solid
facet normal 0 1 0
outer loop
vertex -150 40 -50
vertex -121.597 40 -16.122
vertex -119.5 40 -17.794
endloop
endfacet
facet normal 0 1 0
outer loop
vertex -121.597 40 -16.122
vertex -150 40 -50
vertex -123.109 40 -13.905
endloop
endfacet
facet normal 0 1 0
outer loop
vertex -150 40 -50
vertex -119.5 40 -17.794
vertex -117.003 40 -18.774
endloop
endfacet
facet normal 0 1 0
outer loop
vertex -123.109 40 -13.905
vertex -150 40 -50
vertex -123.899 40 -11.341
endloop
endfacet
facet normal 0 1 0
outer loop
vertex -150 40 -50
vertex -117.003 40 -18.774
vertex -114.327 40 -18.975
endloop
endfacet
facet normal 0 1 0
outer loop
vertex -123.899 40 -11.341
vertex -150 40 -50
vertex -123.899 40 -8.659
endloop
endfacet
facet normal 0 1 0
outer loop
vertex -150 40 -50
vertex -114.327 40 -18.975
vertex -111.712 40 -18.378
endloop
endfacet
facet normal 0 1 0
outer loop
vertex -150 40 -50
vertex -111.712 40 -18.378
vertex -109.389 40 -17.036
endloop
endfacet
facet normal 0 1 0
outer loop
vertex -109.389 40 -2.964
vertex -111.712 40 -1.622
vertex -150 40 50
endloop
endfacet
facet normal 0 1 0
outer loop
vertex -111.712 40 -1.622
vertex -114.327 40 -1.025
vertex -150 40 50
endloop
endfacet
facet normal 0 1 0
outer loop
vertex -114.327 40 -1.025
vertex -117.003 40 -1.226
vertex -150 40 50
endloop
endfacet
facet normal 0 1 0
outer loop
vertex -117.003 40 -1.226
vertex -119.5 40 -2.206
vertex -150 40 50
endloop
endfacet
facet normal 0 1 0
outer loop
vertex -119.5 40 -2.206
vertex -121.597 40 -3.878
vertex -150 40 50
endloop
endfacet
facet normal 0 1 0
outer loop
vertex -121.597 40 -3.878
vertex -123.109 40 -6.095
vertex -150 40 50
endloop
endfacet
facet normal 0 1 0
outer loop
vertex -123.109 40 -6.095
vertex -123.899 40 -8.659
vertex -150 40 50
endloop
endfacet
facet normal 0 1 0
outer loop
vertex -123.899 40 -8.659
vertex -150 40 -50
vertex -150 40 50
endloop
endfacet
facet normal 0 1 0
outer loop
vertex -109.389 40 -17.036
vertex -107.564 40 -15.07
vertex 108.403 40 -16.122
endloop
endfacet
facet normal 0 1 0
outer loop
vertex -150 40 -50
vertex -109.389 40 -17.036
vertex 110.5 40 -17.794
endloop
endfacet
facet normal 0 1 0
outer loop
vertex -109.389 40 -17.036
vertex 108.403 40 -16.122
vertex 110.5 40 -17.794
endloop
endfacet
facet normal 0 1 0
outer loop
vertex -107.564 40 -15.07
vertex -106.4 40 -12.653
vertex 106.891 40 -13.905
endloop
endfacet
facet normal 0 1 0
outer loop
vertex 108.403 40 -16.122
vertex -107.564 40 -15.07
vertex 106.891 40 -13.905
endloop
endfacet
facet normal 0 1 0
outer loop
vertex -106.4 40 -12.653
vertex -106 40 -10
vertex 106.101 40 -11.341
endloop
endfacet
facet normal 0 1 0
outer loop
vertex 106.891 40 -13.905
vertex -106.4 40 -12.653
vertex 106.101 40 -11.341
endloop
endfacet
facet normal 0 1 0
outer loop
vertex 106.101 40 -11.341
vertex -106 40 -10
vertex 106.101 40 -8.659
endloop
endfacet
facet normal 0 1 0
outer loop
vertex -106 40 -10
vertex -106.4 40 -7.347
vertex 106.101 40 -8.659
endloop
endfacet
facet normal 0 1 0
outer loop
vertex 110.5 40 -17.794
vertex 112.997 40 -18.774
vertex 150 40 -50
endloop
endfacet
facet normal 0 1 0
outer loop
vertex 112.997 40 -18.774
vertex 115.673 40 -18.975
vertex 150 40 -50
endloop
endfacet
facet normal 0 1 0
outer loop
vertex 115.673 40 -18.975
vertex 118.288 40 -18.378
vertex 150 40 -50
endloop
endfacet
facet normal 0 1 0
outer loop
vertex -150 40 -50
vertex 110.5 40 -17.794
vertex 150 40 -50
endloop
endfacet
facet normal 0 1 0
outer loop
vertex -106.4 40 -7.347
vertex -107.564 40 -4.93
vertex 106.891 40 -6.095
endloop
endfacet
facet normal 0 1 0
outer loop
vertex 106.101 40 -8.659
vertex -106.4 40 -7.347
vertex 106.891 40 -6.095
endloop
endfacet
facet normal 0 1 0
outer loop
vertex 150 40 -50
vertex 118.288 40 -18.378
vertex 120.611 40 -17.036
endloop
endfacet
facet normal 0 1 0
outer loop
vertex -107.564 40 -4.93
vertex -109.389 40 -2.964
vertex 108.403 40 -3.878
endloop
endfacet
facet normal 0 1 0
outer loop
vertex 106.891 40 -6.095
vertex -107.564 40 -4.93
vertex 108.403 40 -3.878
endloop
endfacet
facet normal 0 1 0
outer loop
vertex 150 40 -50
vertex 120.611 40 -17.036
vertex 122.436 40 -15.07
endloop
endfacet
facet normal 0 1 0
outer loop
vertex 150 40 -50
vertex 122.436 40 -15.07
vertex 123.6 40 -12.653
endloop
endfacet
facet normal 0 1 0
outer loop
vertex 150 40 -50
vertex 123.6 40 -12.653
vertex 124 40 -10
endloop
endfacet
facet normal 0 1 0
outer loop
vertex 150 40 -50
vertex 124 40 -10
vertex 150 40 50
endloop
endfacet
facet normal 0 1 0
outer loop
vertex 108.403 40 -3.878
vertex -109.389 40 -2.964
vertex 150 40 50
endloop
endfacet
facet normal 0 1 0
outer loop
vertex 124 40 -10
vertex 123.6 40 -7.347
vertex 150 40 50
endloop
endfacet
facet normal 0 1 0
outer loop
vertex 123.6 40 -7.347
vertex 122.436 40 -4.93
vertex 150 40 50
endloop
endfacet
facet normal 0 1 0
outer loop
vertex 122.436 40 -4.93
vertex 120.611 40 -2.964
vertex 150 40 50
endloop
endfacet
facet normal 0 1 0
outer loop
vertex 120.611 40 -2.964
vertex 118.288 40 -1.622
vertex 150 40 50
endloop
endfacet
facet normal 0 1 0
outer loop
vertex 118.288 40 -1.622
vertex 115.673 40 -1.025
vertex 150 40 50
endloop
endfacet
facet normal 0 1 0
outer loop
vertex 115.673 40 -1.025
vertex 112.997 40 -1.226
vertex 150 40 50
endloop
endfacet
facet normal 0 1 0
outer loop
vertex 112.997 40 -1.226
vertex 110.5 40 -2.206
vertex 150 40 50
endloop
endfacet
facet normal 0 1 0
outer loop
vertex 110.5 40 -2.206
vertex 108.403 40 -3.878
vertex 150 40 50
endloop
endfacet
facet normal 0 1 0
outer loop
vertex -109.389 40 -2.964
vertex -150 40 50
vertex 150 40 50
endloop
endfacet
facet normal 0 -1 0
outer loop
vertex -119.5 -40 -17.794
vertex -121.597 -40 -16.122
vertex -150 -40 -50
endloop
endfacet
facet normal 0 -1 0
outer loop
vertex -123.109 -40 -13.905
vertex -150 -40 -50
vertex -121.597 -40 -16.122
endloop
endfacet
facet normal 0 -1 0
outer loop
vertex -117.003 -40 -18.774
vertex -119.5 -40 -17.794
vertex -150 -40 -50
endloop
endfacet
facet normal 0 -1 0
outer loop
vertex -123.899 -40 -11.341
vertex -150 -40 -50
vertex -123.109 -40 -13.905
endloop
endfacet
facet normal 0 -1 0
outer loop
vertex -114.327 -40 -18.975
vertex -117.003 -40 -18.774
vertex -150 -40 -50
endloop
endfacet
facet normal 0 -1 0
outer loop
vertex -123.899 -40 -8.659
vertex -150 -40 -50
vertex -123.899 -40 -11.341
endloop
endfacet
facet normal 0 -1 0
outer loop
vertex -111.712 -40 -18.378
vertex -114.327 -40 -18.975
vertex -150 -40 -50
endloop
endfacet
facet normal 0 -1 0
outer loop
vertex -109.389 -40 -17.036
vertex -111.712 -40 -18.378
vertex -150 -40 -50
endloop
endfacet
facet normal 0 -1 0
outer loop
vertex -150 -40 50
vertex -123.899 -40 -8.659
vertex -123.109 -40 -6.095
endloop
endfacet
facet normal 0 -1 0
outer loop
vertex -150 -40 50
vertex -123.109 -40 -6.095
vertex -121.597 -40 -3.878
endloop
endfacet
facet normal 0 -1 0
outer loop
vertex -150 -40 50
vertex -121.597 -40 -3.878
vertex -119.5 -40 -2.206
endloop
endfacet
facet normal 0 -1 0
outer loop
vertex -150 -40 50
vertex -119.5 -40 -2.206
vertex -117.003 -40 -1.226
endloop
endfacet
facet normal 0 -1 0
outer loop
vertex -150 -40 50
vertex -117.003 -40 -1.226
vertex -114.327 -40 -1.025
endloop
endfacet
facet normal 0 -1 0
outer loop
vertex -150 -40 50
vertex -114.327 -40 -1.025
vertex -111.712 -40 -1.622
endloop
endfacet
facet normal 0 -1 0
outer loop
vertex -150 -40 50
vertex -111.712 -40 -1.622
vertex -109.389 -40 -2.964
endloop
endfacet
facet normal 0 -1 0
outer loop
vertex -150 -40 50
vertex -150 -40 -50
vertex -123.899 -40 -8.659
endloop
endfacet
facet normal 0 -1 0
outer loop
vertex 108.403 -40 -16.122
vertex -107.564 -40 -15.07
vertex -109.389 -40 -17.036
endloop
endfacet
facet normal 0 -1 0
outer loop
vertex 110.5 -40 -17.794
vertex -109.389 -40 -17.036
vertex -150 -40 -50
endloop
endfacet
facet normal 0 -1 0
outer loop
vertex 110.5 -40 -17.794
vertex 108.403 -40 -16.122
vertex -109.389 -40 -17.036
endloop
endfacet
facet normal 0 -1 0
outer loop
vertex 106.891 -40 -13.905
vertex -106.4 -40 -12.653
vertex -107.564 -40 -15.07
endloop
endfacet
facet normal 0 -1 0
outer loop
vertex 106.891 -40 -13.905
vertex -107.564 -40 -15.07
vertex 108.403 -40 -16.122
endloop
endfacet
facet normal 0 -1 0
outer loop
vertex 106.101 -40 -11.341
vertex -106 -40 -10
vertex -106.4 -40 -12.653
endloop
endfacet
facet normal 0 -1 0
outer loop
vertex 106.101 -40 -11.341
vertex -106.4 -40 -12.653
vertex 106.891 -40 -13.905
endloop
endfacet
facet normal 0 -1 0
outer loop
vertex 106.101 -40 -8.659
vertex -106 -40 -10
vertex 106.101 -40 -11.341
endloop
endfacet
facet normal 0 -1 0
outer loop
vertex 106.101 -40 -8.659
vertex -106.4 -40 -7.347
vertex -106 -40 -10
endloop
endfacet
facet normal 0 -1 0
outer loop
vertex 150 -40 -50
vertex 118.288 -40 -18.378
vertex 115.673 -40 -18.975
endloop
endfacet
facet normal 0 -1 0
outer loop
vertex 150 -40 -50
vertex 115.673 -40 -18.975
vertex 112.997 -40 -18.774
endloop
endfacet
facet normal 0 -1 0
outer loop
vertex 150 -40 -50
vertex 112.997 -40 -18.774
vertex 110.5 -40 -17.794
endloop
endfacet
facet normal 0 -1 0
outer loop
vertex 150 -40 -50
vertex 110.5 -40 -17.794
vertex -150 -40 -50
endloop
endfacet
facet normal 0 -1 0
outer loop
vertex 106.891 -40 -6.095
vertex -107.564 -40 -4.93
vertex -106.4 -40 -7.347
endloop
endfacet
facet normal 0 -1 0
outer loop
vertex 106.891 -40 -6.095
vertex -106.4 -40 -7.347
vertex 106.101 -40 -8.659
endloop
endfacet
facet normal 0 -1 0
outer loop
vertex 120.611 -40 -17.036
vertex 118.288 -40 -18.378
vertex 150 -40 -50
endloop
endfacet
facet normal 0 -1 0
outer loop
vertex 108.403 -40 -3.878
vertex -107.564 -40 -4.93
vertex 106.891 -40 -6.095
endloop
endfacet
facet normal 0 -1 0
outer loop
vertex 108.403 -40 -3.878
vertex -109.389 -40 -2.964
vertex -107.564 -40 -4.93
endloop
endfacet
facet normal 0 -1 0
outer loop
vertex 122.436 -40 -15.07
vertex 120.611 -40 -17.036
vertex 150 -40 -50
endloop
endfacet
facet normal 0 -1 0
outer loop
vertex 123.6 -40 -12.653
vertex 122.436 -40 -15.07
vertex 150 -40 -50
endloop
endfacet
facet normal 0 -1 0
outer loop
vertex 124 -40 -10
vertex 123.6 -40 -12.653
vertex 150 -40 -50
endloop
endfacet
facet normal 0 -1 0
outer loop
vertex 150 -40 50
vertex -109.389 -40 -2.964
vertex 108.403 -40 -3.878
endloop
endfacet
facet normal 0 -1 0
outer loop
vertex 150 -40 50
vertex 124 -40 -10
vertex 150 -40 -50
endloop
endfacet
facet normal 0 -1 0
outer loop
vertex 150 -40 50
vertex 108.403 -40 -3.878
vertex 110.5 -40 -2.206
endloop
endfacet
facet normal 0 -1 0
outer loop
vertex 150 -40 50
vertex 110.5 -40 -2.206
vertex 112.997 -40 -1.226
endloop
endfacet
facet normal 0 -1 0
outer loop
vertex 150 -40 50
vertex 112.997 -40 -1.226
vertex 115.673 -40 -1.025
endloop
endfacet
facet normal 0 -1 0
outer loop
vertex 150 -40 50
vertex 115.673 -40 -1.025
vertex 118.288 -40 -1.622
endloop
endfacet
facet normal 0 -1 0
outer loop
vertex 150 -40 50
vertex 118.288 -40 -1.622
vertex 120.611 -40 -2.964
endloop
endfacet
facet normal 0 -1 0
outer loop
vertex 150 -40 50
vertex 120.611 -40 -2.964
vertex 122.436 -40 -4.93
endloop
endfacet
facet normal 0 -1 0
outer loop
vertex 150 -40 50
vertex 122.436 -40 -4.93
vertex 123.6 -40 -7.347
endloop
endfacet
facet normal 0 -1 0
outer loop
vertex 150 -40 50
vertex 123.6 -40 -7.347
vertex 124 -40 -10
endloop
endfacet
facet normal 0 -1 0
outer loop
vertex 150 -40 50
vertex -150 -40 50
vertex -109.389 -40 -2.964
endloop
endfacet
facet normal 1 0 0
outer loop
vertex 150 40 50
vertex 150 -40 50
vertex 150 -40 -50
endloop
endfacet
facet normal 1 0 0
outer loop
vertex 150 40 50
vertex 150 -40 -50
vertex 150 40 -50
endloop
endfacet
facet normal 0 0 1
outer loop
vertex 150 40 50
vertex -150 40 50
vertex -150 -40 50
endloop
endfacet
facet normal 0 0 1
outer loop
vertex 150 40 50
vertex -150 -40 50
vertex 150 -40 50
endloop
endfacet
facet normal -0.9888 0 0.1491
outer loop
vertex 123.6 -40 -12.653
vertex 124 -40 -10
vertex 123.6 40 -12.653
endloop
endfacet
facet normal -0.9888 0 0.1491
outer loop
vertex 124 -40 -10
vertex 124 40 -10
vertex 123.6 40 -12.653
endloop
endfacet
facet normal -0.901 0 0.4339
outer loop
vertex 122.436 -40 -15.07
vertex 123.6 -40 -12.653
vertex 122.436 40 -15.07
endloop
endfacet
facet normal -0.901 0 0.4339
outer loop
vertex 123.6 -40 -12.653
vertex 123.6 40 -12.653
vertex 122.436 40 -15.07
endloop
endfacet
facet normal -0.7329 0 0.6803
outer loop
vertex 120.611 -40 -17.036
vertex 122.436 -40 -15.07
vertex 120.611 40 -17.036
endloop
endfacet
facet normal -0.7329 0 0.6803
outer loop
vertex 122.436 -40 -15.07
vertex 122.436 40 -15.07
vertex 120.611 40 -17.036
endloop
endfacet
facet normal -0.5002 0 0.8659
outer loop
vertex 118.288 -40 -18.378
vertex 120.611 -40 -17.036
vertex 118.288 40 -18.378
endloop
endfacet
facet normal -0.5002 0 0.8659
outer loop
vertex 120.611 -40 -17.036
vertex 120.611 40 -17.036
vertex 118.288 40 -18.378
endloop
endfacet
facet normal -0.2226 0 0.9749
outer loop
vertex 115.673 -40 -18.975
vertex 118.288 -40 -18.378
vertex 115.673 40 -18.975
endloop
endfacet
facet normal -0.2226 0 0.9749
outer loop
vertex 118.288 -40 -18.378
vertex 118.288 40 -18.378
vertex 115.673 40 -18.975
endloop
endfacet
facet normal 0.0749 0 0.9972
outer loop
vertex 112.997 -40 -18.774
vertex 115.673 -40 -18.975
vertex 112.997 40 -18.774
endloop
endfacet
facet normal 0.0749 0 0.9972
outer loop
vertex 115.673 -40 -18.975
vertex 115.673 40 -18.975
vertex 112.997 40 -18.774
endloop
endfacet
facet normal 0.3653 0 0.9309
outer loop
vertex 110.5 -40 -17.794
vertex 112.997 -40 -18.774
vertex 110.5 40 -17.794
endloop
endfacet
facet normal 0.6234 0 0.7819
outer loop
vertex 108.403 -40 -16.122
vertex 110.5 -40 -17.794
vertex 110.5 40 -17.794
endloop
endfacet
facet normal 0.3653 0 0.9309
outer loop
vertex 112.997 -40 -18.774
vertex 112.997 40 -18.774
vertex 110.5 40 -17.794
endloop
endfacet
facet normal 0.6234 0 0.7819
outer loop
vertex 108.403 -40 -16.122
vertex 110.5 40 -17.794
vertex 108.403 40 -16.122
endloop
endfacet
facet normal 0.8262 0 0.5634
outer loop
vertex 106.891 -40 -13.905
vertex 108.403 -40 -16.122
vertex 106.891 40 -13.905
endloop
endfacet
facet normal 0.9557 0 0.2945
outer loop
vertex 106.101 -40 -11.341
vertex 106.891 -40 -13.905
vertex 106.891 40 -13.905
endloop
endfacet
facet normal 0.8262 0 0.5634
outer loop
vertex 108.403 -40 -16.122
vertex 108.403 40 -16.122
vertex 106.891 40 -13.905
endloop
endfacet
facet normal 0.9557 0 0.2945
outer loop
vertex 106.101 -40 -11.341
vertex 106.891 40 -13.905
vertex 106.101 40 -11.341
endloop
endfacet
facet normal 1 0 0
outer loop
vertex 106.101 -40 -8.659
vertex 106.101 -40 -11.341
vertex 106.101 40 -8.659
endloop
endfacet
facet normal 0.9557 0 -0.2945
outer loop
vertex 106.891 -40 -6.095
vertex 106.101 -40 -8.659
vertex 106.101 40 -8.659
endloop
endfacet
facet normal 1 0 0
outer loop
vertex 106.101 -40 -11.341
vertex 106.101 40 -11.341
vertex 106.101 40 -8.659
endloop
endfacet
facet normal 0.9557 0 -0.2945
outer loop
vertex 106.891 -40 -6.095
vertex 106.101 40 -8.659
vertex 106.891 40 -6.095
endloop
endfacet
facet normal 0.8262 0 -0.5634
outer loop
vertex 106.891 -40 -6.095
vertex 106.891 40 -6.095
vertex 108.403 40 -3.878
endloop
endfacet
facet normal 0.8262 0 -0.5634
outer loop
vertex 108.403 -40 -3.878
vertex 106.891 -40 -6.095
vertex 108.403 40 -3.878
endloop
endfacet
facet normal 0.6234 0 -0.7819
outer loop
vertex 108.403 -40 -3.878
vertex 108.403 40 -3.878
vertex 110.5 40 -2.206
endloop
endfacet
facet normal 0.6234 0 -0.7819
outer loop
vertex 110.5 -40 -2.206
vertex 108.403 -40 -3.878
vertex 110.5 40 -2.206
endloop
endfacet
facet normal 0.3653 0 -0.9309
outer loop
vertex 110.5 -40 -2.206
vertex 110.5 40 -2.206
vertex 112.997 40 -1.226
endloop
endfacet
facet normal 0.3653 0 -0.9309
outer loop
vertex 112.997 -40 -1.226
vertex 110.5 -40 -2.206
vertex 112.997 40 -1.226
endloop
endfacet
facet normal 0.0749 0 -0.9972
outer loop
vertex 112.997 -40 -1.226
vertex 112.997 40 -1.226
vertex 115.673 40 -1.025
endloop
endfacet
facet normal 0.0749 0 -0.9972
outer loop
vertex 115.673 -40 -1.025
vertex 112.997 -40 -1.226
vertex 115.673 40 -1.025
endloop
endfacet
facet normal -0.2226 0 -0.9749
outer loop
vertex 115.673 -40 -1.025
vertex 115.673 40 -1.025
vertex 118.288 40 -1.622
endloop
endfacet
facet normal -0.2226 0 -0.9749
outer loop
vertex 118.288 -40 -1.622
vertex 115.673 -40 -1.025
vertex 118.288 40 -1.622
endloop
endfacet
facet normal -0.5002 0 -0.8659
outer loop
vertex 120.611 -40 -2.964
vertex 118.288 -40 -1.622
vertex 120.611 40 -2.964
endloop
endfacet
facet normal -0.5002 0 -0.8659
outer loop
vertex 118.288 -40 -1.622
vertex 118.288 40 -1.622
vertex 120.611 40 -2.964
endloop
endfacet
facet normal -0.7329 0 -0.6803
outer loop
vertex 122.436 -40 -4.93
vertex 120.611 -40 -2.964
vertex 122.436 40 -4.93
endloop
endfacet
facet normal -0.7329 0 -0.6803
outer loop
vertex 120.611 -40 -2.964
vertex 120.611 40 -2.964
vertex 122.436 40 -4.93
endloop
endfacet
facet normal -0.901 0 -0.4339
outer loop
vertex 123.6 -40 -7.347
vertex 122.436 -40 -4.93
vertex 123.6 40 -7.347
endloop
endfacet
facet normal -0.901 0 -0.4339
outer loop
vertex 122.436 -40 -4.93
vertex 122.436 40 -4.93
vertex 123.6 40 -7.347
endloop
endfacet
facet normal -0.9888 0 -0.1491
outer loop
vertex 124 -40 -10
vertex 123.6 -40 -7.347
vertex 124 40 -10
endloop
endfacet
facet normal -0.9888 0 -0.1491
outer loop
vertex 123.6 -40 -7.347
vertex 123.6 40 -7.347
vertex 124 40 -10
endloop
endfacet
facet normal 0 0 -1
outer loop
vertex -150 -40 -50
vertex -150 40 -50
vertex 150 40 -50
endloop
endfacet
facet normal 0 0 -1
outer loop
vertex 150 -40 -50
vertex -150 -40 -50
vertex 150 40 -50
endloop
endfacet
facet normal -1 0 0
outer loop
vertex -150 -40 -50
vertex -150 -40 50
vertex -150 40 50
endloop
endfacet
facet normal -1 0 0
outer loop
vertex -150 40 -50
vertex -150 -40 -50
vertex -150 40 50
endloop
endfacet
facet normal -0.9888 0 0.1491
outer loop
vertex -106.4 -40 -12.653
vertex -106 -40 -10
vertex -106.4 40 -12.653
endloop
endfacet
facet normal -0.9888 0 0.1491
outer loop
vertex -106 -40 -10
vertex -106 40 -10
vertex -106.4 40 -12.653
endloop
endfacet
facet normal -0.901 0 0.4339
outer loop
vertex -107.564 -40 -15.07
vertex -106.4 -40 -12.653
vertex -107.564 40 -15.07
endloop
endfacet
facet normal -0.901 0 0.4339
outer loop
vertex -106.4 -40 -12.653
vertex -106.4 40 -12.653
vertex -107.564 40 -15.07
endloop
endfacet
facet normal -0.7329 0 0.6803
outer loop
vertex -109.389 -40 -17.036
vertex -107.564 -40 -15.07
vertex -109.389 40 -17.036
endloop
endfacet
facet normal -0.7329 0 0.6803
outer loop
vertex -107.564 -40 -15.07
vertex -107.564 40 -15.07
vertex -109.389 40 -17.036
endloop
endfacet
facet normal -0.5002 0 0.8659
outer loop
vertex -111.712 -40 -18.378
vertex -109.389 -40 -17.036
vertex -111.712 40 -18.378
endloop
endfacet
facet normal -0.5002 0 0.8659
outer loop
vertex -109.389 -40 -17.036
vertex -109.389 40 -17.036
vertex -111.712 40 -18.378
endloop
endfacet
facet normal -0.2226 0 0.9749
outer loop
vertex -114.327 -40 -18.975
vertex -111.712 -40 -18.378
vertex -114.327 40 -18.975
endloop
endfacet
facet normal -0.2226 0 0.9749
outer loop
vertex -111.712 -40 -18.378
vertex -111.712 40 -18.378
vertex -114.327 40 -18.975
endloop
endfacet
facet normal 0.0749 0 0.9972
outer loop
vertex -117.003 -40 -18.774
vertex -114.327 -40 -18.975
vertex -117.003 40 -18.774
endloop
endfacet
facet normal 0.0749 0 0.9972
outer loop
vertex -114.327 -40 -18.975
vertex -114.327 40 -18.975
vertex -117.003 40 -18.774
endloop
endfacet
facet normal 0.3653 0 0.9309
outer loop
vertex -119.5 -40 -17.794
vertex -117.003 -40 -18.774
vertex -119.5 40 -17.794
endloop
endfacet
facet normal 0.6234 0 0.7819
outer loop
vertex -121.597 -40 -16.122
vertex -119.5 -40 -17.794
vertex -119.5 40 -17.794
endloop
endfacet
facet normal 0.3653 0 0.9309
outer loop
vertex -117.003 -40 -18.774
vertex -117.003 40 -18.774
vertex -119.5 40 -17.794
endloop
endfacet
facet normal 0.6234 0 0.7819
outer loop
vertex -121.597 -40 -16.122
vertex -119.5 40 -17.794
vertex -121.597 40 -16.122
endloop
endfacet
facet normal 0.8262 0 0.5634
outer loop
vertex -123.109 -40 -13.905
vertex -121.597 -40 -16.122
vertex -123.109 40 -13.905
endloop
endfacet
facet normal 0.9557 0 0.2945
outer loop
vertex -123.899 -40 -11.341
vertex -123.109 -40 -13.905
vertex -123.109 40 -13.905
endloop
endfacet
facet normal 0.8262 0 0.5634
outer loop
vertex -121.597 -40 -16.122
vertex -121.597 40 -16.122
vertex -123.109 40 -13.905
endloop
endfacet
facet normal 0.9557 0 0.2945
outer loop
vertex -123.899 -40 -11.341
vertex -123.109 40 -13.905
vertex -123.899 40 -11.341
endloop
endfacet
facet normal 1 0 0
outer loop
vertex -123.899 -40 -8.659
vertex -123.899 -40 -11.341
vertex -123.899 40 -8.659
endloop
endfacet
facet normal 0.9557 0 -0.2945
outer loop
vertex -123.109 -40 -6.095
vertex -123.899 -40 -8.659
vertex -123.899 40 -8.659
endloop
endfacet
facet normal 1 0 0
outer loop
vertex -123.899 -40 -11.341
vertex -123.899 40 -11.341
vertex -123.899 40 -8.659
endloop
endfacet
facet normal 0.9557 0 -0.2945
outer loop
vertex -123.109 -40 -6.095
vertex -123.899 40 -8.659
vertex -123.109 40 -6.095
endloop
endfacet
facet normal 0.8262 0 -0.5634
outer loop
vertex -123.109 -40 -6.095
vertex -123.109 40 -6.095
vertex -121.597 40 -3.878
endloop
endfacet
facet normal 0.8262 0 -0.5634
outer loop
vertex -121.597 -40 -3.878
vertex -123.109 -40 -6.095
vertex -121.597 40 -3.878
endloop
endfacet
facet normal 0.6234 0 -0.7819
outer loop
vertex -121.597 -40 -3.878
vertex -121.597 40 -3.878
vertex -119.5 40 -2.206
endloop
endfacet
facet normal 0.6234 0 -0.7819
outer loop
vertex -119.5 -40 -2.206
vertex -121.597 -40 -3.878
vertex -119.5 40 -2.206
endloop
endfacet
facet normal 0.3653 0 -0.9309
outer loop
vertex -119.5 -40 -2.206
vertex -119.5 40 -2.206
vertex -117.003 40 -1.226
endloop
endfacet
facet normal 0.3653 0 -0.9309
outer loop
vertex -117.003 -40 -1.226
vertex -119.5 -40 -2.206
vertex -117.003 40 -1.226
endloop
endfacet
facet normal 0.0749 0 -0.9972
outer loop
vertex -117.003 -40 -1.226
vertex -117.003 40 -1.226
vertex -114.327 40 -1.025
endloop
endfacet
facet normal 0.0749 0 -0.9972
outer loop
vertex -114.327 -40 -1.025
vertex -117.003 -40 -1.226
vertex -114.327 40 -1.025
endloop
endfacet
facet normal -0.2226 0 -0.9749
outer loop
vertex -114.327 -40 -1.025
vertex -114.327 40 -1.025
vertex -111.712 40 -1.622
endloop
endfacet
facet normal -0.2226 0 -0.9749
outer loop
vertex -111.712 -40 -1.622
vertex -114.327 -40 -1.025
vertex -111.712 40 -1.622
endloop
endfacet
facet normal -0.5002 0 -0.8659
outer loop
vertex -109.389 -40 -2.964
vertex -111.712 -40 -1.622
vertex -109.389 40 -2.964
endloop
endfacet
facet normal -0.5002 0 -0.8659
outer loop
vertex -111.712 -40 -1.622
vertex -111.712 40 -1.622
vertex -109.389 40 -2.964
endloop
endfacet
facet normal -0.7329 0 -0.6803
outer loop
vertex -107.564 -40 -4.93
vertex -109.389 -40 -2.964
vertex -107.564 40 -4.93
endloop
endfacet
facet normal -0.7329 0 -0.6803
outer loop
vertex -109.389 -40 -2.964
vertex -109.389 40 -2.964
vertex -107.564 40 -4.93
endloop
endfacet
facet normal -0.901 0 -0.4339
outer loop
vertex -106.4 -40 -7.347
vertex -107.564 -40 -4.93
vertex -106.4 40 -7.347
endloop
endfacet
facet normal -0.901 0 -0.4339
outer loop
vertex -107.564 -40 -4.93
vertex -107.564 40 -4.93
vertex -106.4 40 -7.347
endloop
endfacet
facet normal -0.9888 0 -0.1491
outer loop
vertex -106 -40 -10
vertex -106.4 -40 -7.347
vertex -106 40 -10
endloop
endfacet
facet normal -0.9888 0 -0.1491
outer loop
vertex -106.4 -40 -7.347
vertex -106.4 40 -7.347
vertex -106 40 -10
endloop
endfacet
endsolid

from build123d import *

# Parameters (mm, degrees)
SKETCH1_W               = 300
SKETCH1_H               = 80
BOSS_EXTRUDE1_DEPTH     = 50
SKETCH2_R               = 9
CUT_EXTRUDE1_DEPTH      = 41
CUT_EXTRUDE1_DEPTH_BACK = 41


with BuildPart() as part:
    # Sketch1 → Boss-Extrude1 (new body, symmetric)
    with BuildSketch(Plane.XY):
        Rectangle(SKETCH1_W, SKETCH1_H)
    extrude(amount=BOSS_EXTRUDE1_DEPTH, both=True)

    # Sketch2 → Cut-Extrude1 (cut, two sides)
    with BuildSketch(Plane(origin=(0, 0, 0), x_dir=(1, 0, 0), z_dir=(0, 1, 0))) as cut_extrude1_sk:
        with Locations((-115, 10)):
            Circle(SKETCH2_R)
        with Locations((115, 10)):
            Circle(SKETCH2_R)
    extrude(amount=CUT_EXTRUDE1_DEPTH, mode=Mode.SUBTRACT)
    extrude(cut_extrude1_sk.sketch, amount=-CUT_EXTRUDE1_DEPTH_BACK, mode=Mode.SUBTRACT)


solid = part.part
